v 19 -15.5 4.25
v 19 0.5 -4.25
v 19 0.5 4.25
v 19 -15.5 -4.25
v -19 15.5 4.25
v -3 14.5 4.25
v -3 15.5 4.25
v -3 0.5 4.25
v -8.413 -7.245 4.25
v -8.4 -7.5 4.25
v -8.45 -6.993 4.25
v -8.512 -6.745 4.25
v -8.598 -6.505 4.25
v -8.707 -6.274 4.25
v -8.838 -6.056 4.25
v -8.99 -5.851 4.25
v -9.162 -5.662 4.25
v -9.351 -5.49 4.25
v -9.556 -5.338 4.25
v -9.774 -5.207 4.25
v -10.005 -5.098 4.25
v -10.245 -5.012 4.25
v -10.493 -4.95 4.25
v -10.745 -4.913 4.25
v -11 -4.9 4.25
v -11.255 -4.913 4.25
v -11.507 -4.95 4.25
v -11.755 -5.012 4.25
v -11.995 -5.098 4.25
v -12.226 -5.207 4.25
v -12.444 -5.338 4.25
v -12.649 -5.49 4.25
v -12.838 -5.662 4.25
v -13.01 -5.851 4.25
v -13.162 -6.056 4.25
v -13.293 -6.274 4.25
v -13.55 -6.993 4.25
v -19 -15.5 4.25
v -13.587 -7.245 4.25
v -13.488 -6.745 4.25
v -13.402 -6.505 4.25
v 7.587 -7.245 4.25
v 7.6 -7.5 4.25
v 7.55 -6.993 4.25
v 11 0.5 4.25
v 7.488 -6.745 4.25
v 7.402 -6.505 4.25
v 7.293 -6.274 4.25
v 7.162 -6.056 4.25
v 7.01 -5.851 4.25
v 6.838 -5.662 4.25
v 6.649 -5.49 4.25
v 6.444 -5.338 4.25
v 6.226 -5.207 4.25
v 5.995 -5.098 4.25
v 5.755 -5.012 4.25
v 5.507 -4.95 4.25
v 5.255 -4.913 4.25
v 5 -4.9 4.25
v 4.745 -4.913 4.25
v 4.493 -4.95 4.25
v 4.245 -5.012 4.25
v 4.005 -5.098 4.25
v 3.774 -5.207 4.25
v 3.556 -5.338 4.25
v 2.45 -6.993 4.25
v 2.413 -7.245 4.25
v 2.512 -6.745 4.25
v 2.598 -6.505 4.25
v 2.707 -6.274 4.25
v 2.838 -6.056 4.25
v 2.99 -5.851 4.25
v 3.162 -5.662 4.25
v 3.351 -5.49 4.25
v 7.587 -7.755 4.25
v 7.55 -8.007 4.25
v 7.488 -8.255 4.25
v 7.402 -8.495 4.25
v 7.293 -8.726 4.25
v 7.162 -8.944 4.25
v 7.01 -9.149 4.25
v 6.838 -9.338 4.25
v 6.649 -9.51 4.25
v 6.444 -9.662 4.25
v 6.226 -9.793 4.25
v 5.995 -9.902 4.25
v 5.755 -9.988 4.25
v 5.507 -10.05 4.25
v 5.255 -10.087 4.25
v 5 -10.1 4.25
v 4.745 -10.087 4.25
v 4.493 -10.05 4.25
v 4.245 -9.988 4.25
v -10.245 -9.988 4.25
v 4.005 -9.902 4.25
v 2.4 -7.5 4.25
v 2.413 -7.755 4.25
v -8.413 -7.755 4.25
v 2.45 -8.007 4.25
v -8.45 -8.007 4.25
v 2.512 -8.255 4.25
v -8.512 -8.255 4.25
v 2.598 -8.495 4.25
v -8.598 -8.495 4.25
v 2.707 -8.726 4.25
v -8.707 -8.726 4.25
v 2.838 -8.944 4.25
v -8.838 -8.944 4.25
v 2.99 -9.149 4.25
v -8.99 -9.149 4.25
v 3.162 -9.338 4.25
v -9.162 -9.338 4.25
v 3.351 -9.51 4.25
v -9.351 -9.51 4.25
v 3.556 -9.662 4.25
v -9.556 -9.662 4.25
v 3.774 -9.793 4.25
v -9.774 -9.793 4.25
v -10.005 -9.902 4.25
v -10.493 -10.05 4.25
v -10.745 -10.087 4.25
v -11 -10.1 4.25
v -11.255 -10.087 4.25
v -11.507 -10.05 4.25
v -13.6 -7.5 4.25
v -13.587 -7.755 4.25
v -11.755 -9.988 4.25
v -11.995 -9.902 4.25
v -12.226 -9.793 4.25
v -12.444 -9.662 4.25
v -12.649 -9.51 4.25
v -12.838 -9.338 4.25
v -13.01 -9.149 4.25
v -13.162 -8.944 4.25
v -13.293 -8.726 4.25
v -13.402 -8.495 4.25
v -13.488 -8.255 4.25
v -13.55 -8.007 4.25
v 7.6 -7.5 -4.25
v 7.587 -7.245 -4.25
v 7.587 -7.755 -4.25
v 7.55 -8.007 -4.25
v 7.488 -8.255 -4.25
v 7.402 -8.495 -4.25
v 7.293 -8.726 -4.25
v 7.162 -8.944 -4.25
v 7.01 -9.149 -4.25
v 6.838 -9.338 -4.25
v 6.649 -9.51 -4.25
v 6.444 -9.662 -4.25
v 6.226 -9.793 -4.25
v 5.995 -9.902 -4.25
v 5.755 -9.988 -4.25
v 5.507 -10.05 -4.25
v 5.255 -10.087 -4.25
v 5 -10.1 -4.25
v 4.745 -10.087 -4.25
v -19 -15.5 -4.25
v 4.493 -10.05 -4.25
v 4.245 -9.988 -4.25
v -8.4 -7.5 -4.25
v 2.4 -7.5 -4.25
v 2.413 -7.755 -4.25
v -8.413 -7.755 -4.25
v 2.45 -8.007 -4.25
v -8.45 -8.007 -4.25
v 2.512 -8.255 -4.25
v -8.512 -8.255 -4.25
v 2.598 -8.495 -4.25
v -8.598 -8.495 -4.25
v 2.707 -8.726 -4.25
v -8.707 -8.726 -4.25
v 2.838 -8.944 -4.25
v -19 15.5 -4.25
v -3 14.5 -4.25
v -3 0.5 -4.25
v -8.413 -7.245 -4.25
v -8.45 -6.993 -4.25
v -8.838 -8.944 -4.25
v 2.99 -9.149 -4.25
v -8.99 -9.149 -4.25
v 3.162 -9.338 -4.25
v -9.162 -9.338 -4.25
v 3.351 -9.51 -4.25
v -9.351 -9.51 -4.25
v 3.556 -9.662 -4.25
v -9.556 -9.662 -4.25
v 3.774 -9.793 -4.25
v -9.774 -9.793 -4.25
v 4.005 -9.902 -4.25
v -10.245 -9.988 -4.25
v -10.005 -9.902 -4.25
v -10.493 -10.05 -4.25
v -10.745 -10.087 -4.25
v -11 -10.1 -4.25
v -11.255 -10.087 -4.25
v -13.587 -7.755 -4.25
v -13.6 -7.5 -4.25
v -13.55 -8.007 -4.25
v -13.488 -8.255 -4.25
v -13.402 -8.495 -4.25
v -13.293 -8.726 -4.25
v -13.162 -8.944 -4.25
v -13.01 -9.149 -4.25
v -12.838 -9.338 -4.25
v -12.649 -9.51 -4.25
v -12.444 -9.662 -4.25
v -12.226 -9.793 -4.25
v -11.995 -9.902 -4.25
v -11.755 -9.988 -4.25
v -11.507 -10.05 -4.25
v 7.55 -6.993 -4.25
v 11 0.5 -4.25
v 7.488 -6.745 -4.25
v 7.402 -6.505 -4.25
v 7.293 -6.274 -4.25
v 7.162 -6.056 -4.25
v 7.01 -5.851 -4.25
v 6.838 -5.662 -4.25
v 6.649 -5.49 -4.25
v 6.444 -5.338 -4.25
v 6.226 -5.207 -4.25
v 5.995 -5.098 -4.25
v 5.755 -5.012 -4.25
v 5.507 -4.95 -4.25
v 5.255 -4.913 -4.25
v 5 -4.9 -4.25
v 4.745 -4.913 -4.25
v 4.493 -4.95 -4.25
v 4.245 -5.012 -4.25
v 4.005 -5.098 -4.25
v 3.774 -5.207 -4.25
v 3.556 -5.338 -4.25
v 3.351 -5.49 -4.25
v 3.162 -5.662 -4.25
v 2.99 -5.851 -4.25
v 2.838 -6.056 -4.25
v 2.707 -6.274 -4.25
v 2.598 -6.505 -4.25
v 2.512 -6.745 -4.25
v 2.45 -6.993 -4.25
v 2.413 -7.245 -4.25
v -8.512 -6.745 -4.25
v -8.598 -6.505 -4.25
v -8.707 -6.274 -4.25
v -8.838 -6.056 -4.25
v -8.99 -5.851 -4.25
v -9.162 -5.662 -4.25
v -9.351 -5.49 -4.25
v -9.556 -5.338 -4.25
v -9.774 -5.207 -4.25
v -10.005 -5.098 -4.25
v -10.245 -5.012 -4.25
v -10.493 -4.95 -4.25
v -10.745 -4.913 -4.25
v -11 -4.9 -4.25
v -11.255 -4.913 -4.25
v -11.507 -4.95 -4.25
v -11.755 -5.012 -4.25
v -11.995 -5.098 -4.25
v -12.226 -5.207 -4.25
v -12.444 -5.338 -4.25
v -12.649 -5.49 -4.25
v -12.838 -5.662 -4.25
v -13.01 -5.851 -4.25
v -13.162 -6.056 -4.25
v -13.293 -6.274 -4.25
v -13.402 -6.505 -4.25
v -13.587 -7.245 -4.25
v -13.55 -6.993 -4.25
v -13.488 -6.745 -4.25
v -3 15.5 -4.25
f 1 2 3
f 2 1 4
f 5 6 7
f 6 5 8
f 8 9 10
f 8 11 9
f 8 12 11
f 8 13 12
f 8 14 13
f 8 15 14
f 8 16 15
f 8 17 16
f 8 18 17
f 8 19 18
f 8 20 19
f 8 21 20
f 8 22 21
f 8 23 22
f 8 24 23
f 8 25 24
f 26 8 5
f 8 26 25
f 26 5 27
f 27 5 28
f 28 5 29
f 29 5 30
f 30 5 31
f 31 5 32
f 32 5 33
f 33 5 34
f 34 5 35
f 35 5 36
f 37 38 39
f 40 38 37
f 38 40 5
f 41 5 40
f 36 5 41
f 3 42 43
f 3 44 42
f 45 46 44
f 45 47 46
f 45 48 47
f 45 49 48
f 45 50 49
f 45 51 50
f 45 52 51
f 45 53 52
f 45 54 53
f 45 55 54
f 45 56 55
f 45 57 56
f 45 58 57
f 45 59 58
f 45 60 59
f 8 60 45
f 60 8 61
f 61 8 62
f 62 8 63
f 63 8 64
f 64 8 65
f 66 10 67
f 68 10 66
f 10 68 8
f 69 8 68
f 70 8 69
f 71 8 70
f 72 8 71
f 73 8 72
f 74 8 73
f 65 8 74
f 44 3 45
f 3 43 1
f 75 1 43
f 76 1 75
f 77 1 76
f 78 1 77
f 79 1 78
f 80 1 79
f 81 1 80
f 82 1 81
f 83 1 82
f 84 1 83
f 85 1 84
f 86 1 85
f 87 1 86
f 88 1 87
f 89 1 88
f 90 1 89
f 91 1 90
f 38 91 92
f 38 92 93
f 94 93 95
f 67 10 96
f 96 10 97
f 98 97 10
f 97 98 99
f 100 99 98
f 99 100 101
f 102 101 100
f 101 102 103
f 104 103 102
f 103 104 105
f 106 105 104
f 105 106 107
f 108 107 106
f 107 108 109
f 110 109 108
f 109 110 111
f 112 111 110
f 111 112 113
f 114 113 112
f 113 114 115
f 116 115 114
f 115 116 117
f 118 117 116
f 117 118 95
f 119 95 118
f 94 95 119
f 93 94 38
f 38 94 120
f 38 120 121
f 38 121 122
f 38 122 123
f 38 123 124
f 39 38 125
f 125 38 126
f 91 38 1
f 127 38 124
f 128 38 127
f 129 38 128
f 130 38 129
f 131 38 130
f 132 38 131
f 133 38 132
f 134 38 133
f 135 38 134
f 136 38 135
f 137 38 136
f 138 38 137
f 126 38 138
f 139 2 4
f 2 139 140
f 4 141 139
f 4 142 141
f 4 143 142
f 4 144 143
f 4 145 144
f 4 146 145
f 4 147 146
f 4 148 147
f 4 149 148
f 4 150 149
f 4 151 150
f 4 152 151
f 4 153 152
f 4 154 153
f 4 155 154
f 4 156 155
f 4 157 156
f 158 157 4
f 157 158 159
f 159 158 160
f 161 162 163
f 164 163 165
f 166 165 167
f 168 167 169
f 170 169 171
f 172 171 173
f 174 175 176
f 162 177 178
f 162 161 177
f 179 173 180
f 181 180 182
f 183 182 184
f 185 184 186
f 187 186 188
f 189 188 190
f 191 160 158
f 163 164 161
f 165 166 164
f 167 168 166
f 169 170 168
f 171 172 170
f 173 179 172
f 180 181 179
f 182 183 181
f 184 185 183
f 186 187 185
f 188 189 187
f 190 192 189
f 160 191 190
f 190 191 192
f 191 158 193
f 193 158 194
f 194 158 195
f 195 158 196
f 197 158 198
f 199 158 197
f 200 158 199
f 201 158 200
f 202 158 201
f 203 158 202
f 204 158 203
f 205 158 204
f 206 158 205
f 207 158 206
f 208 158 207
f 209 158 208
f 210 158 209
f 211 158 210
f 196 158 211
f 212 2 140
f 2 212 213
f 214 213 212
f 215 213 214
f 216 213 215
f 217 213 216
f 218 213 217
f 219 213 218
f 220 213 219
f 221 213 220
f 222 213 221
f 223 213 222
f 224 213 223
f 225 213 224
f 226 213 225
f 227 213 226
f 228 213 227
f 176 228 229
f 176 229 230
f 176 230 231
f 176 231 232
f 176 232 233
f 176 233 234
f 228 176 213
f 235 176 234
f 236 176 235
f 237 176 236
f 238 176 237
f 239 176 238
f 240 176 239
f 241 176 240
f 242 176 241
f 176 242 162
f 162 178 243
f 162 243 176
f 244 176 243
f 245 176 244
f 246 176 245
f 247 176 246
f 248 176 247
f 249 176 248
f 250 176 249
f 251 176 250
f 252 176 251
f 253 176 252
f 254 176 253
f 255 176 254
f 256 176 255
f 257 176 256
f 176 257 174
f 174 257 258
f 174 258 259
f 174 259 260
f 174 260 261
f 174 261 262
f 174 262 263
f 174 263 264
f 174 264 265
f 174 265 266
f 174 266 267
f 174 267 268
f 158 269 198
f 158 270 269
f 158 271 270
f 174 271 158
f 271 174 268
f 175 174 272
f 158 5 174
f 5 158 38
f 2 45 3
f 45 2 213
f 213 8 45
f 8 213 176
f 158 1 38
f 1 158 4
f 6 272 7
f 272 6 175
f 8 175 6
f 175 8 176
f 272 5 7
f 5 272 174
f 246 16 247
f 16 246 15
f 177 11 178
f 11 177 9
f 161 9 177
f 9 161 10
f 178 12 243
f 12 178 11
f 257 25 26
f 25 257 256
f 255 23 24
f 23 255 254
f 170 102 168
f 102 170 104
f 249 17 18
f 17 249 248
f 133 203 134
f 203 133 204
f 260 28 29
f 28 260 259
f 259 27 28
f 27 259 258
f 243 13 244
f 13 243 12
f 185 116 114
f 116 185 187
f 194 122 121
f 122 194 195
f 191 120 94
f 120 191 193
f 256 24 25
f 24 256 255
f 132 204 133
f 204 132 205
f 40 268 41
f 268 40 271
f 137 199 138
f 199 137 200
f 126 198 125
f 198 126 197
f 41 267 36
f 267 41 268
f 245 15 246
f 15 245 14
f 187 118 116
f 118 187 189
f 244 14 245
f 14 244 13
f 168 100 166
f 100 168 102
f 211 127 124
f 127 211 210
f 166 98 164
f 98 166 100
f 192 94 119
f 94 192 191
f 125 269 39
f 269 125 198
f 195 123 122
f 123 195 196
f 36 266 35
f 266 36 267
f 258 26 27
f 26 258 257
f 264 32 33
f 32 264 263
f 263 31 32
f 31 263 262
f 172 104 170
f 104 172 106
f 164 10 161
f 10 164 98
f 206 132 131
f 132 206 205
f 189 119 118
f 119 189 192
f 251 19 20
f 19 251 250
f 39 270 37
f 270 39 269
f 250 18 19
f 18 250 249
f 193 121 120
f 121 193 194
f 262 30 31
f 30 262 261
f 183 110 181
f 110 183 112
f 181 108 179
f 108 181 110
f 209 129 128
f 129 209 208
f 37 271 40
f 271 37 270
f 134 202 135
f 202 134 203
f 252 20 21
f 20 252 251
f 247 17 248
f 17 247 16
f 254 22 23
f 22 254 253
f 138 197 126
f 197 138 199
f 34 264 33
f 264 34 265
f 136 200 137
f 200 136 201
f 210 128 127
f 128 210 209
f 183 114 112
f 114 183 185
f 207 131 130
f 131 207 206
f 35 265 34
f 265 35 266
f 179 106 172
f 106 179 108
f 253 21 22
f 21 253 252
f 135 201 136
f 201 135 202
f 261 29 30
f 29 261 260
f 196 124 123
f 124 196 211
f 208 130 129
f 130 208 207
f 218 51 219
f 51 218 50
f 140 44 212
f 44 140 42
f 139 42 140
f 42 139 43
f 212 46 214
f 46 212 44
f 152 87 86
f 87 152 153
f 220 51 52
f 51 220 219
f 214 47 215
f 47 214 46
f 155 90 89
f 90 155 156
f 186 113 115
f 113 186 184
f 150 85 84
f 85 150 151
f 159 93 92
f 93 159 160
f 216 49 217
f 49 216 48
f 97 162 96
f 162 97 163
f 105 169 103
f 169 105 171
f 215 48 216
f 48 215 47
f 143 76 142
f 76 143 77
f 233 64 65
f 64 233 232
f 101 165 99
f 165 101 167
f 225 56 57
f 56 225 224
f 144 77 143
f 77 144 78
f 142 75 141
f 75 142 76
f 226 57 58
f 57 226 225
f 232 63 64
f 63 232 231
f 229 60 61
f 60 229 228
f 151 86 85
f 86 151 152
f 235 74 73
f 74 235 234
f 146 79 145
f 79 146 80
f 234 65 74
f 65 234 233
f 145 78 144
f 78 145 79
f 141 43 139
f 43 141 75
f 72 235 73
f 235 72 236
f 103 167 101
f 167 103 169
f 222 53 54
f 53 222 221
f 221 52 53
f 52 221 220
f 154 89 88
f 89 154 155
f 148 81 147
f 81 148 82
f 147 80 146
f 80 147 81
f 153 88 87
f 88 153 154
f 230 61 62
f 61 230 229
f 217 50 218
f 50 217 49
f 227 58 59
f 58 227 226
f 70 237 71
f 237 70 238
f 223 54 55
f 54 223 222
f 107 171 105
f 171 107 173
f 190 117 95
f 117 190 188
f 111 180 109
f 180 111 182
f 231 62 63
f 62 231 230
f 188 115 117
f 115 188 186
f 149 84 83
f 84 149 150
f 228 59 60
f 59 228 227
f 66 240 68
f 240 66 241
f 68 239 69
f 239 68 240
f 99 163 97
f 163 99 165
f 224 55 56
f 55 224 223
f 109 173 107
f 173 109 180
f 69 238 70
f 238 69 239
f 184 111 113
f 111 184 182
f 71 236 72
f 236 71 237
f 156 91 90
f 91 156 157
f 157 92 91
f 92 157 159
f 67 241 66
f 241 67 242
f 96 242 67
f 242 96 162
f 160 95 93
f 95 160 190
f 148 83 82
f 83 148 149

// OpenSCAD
$fn = 64;

// Target bracket size (overall bounding box)
overall_length = 38;   // X
overall_width  = 31;   // Y
thickness      = 8.5;  // Z

// Bracket details (typical extrusion corner bracket style)
leg_width = 16;                 // width of each leg band
inner_relief = 14;              // square cutout at inner corner (reduces mass, typical look)
hole_diameter = 5.2;            // clearance for M5
hole_edge_margin = 8;           // from each outer edge along the leg
hole_spacing = 16;              // spacing between the two holes on the long leg
overlap = 0.25;                 // boolean robustness

module bracket_L() {
    difference() {
        // Base L plate (one connected solid)
        union() {
            // X-leg band
            translate([0, -(overall_width/2 - leg_width/2), 0])
                cube([overall_length, leg_width, thickness], center=true);

            // Y-leg band
            translate([-(overall_length/2 - leg_width/2), 0, 0])
                cube([leg_width, overall_width, thickness], center=true);
        }

        // Inner corner relief (kept inside the L so outer bounding box stays [38,31,8.5])
        translate([
            -overall_length/2 + leg_width + inner_relief/2,
            -overall_width/2  + leg_width + inner_relief/2,
            0
        ])
            cube([inner_relief, inner_relief, thickness + 2*overlap], center=true);

        // Hole pattern: 2 holes on the long (X) leg, 1 hole on the short (Y) leg
        // X-leg holes (along X, centered in the leg width)
        for (xpos = [
            -overall_length/2 + hole_edge_margin,
            -overall_length/2 + hole_edge_margin + hole_spacing
        ]) {
            translate([xpos, -overall_width/2 + leg_width/2, 0])
                cylinder(d=hole_diameter, h=thickness + 2*overlap, center=true);
        }

        // Y-leg hole (along Y, centered in the leg width)
        translate([-overall_length/2 + leg_width/2, -overall_width/2 + hole_edge_margin, 0])
            cylinder(d=hole_diameter, h=thickness + 2*overlap, center=true);
    }
}

bracket_L();
